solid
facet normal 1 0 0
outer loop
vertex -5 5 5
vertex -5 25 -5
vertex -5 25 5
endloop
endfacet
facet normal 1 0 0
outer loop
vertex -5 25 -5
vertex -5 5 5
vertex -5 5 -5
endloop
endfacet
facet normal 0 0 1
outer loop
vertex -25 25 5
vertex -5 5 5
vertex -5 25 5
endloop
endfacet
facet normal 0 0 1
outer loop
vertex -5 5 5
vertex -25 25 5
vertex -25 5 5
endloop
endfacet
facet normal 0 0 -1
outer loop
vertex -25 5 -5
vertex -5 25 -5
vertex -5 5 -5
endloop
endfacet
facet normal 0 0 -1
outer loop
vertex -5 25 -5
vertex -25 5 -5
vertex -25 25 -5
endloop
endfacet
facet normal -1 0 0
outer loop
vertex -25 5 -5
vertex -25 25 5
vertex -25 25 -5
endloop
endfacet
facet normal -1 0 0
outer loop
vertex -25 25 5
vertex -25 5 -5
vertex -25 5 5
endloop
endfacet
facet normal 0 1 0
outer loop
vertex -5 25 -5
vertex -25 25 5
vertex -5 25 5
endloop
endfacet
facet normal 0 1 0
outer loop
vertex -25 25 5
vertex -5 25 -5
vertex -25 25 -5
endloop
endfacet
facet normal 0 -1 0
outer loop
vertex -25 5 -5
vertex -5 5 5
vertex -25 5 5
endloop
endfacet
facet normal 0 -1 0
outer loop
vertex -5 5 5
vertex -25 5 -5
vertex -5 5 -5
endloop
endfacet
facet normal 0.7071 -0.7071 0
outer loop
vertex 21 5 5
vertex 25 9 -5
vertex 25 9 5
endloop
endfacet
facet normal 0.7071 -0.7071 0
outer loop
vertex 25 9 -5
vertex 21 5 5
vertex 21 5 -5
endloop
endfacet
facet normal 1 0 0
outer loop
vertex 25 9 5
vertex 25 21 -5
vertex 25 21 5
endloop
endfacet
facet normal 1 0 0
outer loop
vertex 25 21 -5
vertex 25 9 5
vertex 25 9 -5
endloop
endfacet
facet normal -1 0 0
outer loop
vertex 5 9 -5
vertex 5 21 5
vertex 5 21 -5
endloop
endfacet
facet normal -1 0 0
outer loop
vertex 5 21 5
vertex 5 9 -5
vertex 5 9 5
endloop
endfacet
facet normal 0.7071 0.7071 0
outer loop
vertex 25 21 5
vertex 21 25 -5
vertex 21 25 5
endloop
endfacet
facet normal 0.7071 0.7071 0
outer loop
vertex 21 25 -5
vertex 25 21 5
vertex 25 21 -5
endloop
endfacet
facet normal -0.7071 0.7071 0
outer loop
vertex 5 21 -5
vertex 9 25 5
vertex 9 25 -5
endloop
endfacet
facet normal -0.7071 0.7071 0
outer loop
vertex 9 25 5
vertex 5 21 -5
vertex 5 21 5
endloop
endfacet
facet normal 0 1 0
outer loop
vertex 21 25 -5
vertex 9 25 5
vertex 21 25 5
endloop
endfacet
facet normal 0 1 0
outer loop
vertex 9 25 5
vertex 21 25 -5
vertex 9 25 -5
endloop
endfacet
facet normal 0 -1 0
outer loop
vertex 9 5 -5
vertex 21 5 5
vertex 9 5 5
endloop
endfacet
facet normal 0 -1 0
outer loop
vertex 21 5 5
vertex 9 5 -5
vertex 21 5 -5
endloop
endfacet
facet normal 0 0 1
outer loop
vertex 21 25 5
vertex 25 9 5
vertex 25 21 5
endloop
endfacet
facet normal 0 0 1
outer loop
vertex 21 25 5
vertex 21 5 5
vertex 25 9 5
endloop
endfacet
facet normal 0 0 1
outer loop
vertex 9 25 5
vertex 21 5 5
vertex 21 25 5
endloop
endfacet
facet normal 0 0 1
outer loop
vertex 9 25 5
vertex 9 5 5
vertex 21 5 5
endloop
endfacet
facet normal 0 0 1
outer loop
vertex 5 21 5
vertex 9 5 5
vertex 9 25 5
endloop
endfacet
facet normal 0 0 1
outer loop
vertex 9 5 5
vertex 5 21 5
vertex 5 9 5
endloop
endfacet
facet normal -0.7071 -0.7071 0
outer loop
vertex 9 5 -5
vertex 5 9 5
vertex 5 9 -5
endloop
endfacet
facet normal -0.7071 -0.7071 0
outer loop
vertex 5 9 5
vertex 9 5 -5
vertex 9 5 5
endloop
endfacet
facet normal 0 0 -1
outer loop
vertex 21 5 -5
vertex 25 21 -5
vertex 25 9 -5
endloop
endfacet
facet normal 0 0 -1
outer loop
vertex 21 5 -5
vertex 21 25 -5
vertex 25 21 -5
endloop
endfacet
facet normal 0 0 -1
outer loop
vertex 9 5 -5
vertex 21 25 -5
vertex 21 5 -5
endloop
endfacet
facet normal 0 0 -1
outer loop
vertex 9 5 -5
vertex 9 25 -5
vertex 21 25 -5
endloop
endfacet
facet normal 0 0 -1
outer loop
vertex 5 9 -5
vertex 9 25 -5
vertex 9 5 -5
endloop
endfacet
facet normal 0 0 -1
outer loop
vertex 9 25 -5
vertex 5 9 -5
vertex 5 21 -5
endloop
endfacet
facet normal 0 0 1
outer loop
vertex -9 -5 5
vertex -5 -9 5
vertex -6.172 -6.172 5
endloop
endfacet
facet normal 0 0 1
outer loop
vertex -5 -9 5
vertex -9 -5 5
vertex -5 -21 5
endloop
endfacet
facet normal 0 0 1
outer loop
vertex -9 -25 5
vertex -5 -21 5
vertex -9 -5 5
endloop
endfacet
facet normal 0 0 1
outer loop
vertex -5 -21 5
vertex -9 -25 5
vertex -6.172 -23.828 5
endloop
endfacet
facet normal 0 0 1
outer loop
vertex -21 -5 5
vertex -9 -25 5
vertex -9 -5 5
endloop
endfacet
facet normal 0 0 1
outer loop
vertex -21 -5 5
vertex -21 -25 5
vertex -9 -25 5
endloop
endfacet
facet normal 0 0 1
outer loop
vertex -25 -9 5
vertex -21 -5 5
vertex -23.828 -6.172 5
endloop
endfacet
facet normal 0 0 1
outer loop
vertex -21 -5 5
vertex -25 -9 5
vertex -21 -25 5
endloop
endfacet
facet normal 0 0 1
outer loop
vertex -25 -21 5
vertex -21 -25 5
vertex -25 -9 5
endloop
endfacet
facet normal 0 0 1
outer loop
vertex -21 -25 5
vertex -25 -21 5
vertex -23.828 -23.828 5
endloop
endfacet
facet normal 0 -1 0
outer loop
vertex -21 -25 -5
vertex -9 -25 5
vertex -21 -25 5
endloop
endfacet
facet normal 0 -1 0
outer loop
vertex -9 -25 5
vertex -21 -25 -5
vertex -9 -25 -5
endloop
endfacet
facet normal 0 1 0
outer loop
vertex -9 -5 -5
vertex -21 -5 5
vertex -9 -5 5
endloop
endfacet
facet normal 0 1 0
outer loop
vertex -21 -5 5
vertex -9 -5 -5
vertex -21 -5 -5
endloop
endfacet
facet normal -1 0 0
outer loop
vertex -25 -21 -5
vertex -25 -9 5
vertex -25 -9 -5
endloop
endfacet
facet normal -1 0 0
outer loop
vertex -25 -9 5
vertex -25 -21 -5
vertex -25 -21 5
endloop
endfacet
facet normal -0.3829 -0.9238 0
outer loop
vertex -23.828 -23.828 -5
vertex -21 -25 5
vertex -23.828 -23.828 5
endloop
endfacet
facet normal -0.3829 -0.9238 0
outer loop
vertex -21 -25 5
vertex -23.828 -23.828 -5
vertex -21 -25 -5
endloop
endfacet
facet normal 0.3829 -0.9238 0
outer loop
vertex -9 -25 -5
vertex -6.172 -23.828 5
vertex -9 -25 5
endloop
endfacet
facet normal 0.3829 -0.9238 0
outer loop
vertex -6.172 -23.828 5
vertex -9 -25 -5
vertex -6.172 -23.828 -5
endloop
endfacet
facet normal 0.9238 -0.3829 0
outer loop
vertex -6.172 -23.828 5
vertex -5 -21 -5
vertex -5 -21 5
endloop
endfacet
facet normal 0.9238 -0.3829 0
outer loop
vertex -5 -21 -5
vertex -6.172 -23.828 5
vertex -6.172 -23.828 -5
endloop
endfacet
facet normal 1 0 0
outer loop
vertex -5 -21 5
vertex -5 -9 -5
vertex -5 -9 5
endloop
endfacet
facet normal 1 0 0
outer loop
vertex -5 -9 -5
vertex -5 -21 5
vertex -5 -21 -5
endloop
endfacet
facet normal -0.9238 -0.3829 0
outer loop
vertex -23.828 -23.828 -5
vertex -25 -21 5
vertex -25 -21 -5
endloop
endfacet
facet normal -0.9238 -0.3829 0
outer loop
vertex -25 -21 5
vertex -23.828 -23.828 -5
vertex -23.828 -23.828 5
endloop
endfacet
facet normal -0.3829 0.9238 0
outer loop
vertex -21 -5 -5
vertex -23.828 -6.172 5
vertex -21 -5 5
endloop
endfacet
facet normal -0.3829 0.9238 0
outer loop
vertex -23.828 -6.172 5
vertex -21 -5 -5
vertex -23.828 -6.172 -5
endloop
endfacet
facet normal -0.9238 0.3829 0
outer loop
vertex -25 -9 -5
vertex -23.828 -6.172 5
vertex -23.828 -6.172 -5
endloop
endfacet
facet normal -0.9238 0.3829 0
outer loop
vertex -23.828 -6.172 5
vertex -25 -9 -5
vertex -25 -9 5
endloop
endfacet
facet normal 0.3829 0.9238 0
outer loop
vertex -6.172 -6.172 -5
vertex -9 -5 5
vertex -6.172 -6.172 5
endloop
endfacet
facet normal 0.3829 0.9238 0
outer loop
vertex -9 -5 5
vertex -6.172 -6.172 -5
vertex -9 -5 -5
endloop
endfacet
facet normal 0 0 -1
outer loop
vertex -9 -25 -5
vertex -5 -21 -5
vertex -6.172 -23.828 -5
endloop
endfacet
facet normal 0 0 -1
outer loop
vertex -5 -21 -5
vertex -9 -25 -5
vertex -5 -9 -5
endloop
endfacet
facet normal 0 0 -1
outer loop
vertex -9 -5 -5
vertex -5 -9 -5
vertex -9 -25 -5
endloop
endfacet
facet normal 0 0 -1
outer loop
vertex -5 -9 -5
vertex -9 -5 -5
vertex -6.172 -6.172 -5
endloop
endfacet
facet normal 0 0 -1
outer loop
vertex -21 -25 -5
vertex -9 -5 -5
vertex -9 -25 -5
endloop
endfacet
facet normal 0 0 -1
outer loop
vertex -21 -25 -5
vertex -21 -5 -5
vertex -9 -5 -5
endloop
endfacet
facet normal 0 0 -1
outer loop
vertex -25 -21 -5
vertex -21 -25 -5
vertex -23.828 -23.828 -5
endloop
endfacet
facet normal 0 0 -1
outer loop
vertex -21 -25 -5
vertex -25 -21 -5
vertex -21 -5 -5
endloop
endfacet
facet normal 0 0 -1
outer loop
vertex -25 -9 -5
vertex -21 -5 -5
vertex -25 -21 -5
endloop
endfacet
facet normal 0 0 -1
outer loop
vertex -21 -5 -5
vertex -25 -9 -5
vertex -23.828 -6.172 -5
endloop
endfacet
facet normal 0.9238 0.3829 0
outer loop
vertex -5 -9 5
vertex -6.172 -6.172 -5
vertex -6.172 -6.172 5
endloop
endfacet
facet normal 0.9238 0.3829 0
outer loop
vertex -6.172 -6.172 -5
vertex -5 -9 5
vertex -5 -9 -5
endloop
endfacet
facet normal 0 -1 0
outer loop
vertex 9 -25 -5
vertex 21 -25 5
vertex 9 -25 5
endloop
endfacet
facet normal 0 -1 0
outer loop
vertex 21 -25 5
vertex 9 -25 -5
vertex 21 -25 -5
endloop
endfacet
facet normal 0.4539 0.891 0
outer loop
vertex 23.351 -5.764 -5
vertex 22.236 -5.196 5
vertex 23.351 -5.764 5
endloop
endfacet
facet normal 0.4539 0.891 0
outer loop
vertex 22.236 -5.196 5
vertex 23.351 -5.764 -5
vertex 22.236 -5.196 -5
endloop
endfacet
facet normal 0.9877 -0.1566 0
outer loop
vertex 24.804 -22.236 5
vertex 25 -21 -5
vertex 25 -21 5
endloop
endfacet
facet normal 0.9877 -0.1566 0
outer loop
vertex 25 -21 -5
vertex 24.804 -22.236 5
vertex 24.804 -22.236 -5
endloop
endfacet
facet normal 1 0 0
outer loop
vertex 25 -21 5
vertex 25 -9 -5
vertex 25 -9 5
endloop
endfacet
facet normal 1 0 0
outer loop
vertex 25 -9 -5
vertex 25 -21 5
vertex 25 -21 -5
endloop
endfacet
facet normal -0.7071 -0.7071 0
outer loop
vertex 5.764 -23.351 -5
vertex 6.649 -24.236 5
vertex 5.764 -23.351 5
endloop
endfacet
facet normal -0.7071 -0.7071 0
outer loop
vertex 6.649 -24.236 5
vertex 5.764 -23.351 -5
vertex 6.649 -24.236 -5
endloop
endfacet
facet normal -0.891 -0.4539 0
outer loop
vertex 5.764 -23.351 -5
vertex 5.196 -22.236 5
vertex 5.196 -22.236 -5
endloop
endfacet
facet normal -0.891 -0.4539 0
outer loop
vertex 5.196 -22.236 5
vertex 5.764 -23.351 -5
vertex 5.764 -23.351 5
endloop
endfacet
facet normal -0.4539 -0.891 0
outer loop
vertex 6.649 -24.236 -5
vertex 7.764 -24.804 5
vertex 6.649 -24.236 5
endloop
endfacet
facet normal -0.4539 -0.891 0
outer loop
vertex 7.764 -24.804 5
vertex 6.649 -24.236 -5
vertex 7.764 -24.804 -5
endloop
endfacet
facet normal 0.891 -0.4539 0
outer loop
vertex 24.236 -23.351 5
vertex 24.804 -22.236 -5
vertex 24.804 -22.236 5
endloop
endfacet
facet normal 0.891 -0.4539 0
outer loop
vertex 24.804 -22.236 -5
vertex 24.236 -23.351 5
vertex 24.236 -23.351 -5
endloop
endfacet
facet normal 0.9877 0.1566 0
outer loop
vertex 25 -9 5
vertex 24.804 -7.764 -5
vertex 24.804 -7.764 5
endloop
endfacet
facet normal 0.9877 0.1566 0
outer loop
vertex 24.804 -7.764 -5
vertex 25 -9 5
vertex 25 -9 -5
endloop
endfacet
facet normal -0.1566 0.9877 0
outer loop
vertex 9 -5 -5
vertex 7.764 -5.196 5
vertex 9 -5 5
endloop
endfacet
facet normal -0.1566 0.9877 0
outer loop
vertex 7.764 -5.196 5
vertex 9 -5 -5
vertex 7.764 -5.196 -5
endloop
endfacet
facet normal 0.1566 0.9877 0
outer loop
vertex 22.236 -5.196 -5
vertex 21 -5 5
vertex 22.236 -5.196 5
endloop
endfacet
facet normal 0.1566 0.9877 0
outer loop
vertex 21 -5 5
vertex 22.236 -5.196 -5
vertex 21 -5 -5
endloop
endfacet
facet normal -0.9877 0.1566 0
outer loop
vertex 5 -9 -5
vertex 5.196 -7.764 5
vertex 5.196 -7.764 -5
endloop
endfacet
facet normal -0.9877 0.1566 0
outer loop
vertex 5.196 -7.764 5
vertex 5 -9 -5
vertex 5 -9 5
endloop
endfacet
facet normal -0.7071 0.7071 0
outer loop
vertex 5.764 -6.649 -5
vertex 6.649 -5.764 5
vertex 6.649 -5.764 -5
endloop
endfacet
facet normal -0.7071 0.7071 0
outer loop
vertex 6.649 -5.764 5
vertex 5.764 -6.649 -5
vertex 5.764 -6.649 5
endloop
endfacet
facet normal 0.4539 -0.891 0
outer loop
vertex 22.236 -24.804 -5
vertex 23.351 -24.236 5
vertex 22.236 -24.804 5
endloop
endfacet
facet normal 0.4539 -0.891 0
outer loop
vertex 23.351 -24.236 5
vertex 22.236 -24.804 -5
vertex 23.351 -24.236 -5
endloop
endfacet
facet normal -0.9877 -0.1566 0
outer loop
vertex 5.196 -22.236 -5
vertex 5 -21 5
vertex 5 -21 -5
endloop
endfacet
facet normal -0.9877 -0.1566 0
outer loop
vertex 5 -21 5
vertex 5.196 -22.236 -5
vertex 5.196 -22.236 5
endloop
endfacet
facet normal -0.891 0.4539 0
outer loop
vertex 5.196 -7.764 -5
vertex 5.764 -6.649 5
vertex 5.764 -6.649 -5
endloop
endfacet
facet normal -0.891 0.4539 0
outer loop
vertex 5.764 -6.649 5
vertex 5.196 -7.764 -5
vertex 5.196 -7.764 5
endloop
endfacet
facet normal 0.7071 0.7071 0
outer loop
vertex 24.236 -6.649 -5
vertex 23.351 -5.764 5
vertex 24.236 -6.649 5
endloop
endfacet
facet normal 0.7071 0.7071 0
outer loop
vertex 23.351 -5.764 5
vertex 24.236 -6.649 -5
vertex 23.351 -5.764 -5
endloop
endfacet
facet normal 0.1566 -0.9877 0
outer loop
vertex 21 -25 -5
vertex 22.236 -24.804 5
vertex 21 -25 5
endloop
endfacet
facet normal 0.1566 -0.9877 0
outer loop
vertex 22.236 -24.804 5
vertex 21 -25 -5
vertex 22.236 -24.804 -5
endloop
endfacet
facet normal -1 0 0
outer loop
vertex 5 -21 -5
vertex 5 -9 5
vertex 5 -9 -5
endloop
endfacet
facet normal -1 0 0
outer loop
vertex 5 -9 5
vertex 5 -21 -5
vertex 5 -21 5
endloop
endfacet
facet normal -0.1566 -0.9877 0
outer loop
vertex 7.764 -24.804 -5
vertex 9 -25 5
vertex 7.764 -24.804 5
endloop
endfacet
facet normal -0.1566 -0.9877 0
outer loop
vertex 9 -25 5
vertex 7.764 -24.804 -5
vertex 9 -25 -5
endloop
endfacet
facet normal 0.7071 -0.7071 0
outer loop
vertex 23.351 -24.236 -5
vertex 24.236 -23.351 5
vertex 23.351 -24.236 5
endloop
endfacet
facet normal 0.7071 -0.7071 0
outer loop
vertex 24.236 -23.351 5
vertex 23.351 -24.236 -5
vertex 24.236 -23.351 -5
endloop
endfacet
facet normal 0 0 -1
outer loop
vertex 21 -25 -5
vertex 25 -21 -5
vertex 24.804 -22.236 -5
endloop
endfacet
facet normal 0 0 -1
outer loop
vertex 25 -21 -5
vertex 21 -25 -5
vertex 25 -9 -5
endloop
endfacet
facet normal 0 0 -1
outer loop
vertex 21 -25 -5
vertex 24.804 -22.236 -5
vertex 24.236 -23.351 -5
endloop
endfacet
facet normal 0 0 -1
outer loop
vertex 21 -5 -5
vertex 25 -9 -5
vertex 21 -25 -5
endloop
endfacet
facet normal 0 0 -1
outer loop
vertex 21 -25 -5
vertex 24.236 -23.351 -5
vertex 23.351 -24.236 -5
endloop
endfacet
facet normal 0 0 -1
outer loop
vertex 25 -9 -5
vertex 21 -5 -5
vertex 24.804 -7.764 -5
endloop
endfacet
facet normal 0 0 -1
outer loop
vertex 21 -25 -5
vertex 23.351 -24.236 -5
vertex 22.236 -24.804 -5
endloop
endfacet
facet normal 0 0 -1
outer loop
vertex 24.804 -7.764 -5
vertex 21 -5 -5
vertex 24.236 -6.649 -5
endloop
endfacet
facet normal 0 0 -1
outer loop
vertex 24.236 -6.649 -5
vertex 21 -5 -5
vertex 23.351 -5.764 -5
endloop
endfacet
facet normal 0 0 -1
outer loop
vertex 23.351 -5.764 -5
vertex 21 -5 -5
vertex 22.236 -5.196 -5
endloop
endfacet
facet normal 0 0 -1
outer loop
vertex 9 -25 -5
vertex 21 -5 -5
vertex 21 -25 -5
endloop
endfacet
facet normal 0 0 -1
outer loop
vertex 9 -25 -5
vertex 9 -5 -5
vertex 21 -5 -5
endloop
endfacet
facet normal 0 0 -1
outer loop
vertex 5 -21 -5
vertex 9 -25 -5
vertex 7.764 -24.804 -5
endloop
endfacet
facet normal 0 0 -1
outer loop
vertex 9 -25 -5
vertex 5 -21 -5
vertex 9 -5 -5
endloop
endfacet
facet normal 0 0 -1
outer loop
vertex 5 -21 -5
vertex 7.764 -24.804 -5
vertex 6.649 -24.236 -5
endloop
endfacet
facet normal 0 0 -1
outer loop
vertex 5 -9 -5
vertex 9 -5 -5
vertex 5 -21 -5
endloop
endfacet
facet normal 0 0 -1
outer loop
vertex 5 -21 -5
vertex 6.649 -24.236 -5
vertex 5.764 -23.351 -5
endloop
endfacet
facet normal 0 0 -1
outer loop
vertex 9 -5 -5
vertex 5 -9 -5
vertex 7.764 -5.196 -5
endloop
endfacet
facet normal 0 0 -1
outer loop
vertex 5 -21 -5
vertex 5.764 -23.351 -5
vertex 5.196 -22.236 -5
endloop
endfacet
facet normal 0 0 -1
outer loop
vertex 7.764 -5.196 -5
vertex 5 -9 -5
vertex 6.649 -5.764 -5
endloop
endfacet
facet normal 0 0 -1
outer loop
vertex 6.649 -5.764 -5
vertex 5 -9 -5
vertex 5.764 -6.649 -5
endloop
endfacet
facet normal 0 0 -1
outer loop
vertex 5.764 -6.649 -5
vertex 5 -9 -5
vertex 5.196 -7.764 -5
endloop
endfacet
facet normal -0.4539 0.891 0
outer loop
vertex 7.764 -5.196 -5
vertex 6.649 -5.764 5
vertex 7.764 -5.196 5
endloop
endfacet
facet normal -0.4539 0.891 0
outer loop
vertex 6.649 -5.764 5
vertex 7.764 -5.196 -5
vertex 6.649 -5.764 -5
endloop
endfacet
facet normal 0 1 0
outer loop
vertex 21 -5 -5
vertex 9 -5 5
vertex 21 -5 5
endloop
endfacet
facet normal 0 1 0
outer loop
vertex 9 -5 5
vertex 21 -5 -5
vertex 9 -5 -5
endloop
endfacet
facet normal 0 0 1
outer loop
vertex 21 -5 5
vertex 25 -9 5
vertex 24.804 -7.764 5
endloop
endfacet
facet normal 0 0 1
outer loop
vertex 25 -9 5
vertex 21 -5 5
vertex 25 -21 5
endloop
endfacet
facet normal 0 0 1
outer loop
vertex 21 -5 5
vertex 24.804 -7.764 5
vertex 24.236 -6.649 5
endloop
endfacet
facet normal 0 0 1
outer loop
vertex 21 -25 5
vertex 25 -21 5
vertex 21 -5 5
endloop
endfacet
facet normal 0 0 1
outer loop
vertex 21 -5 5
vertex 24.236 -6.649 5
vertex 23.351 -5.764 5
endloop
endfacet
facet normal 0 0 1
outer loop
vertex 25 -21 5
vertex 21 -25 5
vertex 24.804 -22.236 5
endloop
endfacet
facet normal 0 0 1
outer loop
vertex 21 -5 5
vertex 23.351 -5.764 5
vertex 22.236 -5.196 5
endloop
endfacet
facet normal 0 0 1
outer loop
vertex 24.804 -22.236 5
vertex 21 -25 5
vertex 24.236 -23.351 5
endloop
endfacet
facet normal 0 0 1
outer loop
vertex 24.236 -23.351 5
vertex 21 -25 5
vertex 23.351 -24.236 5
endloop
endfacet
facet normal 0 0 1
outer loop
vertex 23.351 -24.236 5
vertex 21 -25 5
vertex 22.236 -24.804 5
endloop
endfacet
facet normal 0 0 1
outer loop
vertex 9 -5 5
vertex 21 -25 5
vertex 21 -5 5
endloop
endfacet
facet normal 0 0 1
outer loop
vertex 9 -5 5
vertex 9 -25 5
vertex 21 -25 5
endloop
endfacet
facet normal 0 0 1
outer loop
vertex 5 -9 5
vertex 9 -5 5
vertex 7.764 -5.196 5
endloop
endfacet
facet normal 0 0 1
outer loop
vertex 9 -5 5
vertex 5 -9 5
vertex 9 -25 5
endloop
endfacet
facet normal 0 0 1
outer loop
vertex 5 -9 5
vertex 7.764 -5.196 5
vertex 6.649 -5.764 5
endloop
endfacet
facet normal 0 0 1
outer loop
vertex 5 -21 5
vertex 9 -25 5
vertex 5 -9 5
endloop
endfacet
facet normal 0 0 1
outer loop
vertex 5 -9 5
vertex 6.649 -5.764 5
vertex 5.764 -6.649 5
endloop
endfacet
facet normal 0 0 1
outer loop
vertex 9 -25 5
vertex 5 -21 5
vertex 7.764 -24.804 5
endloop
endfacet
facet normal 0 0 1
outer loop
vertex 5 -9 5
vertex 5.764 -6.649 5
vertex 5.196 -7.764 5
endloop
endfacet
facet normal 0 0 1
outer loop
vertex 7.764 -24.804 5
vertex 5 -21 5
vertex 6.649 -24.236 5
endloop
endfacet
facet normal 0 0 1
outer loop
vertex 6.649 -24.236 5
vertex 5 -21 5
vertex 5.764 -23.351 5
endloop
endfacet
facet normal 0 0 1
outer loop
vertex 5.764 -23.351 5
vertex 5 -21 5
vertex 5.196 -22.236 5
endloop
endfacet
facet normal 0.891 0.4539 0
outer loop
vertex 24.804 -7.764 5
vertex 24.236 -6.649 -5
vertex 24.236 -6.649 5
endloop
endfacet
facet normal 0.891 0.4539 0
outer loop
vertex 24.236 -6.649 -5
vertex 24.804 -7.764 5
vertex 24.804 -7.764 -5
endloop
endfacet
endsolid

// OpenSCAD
//------------------------------------------------------------------------------
//  Bevel edge cube.
//  (c) Juan Gonzalez-Gomez (Obijuan), Sep-2012
//------------------------------------------------------------------------------

//----------------- IMPLEMENTATION USING THE MINKOWSKI OPERATOR ----------------

//------------------------------------------------------------------------------
//-- Bevel Cube main function
//-- Parameters:
//--   * Size:  Cube size
//--   * cr : Corner radius (if cr==0, a standar cube is built)
//--   * cres:  Corner resolution (in points). cres=0 means flat corners
//------------------------------------------------------------------------------
module bcube(size,cr=0,cres=0)
{
  //-- Internal cube size
  bsize = size - 2*[cr,cr,0];

  //-- Get the (x,y) coorner coordinates in the 1st cuadrant
  x = bsize[0]/2;
  y = bsize[1]/2;

  //-- A corner radius of 0 means a standar cube!
  if (cr==0)
    cube(bsize,center=true);
  else {

      
      //-- The height of minkowski object is double. So
      //-- we sould scale by 0.5
      scale([1,1,0.5])

      //-- This translation is for centering the minkowski objet
      translate([-x, -y,0])

      //-- Built the  beveled cube with minkowski
      minkowski() {

        //-- Internal cube
        cube(bsize,center=true);

        //-- Cylinder in the corner (1st cuadrant)
        translate([x,y, 0])
          cylinder(r=cr, h=bsize[2],center=true, $fn=4*(cres+1));
      }
  }

}


//-- Examples of use of the bcube() module

//-- Standar cube
translate([-15,15,0])
bcube([20,20,10]);

//-- Beveled cube (0 point resolution)
translate([15,15,0])
  bcube([20,20,10],cr=4);

//-- Beveled cube (1 point resolution)
translate([-15,-15,0])
  bcube([20,20,10],cr=4, cres=1);

//-- Beveled cube (4 points resolution)
translate([15,-15,0])
  bcube([20,20,10],cr=4, cres=4);
